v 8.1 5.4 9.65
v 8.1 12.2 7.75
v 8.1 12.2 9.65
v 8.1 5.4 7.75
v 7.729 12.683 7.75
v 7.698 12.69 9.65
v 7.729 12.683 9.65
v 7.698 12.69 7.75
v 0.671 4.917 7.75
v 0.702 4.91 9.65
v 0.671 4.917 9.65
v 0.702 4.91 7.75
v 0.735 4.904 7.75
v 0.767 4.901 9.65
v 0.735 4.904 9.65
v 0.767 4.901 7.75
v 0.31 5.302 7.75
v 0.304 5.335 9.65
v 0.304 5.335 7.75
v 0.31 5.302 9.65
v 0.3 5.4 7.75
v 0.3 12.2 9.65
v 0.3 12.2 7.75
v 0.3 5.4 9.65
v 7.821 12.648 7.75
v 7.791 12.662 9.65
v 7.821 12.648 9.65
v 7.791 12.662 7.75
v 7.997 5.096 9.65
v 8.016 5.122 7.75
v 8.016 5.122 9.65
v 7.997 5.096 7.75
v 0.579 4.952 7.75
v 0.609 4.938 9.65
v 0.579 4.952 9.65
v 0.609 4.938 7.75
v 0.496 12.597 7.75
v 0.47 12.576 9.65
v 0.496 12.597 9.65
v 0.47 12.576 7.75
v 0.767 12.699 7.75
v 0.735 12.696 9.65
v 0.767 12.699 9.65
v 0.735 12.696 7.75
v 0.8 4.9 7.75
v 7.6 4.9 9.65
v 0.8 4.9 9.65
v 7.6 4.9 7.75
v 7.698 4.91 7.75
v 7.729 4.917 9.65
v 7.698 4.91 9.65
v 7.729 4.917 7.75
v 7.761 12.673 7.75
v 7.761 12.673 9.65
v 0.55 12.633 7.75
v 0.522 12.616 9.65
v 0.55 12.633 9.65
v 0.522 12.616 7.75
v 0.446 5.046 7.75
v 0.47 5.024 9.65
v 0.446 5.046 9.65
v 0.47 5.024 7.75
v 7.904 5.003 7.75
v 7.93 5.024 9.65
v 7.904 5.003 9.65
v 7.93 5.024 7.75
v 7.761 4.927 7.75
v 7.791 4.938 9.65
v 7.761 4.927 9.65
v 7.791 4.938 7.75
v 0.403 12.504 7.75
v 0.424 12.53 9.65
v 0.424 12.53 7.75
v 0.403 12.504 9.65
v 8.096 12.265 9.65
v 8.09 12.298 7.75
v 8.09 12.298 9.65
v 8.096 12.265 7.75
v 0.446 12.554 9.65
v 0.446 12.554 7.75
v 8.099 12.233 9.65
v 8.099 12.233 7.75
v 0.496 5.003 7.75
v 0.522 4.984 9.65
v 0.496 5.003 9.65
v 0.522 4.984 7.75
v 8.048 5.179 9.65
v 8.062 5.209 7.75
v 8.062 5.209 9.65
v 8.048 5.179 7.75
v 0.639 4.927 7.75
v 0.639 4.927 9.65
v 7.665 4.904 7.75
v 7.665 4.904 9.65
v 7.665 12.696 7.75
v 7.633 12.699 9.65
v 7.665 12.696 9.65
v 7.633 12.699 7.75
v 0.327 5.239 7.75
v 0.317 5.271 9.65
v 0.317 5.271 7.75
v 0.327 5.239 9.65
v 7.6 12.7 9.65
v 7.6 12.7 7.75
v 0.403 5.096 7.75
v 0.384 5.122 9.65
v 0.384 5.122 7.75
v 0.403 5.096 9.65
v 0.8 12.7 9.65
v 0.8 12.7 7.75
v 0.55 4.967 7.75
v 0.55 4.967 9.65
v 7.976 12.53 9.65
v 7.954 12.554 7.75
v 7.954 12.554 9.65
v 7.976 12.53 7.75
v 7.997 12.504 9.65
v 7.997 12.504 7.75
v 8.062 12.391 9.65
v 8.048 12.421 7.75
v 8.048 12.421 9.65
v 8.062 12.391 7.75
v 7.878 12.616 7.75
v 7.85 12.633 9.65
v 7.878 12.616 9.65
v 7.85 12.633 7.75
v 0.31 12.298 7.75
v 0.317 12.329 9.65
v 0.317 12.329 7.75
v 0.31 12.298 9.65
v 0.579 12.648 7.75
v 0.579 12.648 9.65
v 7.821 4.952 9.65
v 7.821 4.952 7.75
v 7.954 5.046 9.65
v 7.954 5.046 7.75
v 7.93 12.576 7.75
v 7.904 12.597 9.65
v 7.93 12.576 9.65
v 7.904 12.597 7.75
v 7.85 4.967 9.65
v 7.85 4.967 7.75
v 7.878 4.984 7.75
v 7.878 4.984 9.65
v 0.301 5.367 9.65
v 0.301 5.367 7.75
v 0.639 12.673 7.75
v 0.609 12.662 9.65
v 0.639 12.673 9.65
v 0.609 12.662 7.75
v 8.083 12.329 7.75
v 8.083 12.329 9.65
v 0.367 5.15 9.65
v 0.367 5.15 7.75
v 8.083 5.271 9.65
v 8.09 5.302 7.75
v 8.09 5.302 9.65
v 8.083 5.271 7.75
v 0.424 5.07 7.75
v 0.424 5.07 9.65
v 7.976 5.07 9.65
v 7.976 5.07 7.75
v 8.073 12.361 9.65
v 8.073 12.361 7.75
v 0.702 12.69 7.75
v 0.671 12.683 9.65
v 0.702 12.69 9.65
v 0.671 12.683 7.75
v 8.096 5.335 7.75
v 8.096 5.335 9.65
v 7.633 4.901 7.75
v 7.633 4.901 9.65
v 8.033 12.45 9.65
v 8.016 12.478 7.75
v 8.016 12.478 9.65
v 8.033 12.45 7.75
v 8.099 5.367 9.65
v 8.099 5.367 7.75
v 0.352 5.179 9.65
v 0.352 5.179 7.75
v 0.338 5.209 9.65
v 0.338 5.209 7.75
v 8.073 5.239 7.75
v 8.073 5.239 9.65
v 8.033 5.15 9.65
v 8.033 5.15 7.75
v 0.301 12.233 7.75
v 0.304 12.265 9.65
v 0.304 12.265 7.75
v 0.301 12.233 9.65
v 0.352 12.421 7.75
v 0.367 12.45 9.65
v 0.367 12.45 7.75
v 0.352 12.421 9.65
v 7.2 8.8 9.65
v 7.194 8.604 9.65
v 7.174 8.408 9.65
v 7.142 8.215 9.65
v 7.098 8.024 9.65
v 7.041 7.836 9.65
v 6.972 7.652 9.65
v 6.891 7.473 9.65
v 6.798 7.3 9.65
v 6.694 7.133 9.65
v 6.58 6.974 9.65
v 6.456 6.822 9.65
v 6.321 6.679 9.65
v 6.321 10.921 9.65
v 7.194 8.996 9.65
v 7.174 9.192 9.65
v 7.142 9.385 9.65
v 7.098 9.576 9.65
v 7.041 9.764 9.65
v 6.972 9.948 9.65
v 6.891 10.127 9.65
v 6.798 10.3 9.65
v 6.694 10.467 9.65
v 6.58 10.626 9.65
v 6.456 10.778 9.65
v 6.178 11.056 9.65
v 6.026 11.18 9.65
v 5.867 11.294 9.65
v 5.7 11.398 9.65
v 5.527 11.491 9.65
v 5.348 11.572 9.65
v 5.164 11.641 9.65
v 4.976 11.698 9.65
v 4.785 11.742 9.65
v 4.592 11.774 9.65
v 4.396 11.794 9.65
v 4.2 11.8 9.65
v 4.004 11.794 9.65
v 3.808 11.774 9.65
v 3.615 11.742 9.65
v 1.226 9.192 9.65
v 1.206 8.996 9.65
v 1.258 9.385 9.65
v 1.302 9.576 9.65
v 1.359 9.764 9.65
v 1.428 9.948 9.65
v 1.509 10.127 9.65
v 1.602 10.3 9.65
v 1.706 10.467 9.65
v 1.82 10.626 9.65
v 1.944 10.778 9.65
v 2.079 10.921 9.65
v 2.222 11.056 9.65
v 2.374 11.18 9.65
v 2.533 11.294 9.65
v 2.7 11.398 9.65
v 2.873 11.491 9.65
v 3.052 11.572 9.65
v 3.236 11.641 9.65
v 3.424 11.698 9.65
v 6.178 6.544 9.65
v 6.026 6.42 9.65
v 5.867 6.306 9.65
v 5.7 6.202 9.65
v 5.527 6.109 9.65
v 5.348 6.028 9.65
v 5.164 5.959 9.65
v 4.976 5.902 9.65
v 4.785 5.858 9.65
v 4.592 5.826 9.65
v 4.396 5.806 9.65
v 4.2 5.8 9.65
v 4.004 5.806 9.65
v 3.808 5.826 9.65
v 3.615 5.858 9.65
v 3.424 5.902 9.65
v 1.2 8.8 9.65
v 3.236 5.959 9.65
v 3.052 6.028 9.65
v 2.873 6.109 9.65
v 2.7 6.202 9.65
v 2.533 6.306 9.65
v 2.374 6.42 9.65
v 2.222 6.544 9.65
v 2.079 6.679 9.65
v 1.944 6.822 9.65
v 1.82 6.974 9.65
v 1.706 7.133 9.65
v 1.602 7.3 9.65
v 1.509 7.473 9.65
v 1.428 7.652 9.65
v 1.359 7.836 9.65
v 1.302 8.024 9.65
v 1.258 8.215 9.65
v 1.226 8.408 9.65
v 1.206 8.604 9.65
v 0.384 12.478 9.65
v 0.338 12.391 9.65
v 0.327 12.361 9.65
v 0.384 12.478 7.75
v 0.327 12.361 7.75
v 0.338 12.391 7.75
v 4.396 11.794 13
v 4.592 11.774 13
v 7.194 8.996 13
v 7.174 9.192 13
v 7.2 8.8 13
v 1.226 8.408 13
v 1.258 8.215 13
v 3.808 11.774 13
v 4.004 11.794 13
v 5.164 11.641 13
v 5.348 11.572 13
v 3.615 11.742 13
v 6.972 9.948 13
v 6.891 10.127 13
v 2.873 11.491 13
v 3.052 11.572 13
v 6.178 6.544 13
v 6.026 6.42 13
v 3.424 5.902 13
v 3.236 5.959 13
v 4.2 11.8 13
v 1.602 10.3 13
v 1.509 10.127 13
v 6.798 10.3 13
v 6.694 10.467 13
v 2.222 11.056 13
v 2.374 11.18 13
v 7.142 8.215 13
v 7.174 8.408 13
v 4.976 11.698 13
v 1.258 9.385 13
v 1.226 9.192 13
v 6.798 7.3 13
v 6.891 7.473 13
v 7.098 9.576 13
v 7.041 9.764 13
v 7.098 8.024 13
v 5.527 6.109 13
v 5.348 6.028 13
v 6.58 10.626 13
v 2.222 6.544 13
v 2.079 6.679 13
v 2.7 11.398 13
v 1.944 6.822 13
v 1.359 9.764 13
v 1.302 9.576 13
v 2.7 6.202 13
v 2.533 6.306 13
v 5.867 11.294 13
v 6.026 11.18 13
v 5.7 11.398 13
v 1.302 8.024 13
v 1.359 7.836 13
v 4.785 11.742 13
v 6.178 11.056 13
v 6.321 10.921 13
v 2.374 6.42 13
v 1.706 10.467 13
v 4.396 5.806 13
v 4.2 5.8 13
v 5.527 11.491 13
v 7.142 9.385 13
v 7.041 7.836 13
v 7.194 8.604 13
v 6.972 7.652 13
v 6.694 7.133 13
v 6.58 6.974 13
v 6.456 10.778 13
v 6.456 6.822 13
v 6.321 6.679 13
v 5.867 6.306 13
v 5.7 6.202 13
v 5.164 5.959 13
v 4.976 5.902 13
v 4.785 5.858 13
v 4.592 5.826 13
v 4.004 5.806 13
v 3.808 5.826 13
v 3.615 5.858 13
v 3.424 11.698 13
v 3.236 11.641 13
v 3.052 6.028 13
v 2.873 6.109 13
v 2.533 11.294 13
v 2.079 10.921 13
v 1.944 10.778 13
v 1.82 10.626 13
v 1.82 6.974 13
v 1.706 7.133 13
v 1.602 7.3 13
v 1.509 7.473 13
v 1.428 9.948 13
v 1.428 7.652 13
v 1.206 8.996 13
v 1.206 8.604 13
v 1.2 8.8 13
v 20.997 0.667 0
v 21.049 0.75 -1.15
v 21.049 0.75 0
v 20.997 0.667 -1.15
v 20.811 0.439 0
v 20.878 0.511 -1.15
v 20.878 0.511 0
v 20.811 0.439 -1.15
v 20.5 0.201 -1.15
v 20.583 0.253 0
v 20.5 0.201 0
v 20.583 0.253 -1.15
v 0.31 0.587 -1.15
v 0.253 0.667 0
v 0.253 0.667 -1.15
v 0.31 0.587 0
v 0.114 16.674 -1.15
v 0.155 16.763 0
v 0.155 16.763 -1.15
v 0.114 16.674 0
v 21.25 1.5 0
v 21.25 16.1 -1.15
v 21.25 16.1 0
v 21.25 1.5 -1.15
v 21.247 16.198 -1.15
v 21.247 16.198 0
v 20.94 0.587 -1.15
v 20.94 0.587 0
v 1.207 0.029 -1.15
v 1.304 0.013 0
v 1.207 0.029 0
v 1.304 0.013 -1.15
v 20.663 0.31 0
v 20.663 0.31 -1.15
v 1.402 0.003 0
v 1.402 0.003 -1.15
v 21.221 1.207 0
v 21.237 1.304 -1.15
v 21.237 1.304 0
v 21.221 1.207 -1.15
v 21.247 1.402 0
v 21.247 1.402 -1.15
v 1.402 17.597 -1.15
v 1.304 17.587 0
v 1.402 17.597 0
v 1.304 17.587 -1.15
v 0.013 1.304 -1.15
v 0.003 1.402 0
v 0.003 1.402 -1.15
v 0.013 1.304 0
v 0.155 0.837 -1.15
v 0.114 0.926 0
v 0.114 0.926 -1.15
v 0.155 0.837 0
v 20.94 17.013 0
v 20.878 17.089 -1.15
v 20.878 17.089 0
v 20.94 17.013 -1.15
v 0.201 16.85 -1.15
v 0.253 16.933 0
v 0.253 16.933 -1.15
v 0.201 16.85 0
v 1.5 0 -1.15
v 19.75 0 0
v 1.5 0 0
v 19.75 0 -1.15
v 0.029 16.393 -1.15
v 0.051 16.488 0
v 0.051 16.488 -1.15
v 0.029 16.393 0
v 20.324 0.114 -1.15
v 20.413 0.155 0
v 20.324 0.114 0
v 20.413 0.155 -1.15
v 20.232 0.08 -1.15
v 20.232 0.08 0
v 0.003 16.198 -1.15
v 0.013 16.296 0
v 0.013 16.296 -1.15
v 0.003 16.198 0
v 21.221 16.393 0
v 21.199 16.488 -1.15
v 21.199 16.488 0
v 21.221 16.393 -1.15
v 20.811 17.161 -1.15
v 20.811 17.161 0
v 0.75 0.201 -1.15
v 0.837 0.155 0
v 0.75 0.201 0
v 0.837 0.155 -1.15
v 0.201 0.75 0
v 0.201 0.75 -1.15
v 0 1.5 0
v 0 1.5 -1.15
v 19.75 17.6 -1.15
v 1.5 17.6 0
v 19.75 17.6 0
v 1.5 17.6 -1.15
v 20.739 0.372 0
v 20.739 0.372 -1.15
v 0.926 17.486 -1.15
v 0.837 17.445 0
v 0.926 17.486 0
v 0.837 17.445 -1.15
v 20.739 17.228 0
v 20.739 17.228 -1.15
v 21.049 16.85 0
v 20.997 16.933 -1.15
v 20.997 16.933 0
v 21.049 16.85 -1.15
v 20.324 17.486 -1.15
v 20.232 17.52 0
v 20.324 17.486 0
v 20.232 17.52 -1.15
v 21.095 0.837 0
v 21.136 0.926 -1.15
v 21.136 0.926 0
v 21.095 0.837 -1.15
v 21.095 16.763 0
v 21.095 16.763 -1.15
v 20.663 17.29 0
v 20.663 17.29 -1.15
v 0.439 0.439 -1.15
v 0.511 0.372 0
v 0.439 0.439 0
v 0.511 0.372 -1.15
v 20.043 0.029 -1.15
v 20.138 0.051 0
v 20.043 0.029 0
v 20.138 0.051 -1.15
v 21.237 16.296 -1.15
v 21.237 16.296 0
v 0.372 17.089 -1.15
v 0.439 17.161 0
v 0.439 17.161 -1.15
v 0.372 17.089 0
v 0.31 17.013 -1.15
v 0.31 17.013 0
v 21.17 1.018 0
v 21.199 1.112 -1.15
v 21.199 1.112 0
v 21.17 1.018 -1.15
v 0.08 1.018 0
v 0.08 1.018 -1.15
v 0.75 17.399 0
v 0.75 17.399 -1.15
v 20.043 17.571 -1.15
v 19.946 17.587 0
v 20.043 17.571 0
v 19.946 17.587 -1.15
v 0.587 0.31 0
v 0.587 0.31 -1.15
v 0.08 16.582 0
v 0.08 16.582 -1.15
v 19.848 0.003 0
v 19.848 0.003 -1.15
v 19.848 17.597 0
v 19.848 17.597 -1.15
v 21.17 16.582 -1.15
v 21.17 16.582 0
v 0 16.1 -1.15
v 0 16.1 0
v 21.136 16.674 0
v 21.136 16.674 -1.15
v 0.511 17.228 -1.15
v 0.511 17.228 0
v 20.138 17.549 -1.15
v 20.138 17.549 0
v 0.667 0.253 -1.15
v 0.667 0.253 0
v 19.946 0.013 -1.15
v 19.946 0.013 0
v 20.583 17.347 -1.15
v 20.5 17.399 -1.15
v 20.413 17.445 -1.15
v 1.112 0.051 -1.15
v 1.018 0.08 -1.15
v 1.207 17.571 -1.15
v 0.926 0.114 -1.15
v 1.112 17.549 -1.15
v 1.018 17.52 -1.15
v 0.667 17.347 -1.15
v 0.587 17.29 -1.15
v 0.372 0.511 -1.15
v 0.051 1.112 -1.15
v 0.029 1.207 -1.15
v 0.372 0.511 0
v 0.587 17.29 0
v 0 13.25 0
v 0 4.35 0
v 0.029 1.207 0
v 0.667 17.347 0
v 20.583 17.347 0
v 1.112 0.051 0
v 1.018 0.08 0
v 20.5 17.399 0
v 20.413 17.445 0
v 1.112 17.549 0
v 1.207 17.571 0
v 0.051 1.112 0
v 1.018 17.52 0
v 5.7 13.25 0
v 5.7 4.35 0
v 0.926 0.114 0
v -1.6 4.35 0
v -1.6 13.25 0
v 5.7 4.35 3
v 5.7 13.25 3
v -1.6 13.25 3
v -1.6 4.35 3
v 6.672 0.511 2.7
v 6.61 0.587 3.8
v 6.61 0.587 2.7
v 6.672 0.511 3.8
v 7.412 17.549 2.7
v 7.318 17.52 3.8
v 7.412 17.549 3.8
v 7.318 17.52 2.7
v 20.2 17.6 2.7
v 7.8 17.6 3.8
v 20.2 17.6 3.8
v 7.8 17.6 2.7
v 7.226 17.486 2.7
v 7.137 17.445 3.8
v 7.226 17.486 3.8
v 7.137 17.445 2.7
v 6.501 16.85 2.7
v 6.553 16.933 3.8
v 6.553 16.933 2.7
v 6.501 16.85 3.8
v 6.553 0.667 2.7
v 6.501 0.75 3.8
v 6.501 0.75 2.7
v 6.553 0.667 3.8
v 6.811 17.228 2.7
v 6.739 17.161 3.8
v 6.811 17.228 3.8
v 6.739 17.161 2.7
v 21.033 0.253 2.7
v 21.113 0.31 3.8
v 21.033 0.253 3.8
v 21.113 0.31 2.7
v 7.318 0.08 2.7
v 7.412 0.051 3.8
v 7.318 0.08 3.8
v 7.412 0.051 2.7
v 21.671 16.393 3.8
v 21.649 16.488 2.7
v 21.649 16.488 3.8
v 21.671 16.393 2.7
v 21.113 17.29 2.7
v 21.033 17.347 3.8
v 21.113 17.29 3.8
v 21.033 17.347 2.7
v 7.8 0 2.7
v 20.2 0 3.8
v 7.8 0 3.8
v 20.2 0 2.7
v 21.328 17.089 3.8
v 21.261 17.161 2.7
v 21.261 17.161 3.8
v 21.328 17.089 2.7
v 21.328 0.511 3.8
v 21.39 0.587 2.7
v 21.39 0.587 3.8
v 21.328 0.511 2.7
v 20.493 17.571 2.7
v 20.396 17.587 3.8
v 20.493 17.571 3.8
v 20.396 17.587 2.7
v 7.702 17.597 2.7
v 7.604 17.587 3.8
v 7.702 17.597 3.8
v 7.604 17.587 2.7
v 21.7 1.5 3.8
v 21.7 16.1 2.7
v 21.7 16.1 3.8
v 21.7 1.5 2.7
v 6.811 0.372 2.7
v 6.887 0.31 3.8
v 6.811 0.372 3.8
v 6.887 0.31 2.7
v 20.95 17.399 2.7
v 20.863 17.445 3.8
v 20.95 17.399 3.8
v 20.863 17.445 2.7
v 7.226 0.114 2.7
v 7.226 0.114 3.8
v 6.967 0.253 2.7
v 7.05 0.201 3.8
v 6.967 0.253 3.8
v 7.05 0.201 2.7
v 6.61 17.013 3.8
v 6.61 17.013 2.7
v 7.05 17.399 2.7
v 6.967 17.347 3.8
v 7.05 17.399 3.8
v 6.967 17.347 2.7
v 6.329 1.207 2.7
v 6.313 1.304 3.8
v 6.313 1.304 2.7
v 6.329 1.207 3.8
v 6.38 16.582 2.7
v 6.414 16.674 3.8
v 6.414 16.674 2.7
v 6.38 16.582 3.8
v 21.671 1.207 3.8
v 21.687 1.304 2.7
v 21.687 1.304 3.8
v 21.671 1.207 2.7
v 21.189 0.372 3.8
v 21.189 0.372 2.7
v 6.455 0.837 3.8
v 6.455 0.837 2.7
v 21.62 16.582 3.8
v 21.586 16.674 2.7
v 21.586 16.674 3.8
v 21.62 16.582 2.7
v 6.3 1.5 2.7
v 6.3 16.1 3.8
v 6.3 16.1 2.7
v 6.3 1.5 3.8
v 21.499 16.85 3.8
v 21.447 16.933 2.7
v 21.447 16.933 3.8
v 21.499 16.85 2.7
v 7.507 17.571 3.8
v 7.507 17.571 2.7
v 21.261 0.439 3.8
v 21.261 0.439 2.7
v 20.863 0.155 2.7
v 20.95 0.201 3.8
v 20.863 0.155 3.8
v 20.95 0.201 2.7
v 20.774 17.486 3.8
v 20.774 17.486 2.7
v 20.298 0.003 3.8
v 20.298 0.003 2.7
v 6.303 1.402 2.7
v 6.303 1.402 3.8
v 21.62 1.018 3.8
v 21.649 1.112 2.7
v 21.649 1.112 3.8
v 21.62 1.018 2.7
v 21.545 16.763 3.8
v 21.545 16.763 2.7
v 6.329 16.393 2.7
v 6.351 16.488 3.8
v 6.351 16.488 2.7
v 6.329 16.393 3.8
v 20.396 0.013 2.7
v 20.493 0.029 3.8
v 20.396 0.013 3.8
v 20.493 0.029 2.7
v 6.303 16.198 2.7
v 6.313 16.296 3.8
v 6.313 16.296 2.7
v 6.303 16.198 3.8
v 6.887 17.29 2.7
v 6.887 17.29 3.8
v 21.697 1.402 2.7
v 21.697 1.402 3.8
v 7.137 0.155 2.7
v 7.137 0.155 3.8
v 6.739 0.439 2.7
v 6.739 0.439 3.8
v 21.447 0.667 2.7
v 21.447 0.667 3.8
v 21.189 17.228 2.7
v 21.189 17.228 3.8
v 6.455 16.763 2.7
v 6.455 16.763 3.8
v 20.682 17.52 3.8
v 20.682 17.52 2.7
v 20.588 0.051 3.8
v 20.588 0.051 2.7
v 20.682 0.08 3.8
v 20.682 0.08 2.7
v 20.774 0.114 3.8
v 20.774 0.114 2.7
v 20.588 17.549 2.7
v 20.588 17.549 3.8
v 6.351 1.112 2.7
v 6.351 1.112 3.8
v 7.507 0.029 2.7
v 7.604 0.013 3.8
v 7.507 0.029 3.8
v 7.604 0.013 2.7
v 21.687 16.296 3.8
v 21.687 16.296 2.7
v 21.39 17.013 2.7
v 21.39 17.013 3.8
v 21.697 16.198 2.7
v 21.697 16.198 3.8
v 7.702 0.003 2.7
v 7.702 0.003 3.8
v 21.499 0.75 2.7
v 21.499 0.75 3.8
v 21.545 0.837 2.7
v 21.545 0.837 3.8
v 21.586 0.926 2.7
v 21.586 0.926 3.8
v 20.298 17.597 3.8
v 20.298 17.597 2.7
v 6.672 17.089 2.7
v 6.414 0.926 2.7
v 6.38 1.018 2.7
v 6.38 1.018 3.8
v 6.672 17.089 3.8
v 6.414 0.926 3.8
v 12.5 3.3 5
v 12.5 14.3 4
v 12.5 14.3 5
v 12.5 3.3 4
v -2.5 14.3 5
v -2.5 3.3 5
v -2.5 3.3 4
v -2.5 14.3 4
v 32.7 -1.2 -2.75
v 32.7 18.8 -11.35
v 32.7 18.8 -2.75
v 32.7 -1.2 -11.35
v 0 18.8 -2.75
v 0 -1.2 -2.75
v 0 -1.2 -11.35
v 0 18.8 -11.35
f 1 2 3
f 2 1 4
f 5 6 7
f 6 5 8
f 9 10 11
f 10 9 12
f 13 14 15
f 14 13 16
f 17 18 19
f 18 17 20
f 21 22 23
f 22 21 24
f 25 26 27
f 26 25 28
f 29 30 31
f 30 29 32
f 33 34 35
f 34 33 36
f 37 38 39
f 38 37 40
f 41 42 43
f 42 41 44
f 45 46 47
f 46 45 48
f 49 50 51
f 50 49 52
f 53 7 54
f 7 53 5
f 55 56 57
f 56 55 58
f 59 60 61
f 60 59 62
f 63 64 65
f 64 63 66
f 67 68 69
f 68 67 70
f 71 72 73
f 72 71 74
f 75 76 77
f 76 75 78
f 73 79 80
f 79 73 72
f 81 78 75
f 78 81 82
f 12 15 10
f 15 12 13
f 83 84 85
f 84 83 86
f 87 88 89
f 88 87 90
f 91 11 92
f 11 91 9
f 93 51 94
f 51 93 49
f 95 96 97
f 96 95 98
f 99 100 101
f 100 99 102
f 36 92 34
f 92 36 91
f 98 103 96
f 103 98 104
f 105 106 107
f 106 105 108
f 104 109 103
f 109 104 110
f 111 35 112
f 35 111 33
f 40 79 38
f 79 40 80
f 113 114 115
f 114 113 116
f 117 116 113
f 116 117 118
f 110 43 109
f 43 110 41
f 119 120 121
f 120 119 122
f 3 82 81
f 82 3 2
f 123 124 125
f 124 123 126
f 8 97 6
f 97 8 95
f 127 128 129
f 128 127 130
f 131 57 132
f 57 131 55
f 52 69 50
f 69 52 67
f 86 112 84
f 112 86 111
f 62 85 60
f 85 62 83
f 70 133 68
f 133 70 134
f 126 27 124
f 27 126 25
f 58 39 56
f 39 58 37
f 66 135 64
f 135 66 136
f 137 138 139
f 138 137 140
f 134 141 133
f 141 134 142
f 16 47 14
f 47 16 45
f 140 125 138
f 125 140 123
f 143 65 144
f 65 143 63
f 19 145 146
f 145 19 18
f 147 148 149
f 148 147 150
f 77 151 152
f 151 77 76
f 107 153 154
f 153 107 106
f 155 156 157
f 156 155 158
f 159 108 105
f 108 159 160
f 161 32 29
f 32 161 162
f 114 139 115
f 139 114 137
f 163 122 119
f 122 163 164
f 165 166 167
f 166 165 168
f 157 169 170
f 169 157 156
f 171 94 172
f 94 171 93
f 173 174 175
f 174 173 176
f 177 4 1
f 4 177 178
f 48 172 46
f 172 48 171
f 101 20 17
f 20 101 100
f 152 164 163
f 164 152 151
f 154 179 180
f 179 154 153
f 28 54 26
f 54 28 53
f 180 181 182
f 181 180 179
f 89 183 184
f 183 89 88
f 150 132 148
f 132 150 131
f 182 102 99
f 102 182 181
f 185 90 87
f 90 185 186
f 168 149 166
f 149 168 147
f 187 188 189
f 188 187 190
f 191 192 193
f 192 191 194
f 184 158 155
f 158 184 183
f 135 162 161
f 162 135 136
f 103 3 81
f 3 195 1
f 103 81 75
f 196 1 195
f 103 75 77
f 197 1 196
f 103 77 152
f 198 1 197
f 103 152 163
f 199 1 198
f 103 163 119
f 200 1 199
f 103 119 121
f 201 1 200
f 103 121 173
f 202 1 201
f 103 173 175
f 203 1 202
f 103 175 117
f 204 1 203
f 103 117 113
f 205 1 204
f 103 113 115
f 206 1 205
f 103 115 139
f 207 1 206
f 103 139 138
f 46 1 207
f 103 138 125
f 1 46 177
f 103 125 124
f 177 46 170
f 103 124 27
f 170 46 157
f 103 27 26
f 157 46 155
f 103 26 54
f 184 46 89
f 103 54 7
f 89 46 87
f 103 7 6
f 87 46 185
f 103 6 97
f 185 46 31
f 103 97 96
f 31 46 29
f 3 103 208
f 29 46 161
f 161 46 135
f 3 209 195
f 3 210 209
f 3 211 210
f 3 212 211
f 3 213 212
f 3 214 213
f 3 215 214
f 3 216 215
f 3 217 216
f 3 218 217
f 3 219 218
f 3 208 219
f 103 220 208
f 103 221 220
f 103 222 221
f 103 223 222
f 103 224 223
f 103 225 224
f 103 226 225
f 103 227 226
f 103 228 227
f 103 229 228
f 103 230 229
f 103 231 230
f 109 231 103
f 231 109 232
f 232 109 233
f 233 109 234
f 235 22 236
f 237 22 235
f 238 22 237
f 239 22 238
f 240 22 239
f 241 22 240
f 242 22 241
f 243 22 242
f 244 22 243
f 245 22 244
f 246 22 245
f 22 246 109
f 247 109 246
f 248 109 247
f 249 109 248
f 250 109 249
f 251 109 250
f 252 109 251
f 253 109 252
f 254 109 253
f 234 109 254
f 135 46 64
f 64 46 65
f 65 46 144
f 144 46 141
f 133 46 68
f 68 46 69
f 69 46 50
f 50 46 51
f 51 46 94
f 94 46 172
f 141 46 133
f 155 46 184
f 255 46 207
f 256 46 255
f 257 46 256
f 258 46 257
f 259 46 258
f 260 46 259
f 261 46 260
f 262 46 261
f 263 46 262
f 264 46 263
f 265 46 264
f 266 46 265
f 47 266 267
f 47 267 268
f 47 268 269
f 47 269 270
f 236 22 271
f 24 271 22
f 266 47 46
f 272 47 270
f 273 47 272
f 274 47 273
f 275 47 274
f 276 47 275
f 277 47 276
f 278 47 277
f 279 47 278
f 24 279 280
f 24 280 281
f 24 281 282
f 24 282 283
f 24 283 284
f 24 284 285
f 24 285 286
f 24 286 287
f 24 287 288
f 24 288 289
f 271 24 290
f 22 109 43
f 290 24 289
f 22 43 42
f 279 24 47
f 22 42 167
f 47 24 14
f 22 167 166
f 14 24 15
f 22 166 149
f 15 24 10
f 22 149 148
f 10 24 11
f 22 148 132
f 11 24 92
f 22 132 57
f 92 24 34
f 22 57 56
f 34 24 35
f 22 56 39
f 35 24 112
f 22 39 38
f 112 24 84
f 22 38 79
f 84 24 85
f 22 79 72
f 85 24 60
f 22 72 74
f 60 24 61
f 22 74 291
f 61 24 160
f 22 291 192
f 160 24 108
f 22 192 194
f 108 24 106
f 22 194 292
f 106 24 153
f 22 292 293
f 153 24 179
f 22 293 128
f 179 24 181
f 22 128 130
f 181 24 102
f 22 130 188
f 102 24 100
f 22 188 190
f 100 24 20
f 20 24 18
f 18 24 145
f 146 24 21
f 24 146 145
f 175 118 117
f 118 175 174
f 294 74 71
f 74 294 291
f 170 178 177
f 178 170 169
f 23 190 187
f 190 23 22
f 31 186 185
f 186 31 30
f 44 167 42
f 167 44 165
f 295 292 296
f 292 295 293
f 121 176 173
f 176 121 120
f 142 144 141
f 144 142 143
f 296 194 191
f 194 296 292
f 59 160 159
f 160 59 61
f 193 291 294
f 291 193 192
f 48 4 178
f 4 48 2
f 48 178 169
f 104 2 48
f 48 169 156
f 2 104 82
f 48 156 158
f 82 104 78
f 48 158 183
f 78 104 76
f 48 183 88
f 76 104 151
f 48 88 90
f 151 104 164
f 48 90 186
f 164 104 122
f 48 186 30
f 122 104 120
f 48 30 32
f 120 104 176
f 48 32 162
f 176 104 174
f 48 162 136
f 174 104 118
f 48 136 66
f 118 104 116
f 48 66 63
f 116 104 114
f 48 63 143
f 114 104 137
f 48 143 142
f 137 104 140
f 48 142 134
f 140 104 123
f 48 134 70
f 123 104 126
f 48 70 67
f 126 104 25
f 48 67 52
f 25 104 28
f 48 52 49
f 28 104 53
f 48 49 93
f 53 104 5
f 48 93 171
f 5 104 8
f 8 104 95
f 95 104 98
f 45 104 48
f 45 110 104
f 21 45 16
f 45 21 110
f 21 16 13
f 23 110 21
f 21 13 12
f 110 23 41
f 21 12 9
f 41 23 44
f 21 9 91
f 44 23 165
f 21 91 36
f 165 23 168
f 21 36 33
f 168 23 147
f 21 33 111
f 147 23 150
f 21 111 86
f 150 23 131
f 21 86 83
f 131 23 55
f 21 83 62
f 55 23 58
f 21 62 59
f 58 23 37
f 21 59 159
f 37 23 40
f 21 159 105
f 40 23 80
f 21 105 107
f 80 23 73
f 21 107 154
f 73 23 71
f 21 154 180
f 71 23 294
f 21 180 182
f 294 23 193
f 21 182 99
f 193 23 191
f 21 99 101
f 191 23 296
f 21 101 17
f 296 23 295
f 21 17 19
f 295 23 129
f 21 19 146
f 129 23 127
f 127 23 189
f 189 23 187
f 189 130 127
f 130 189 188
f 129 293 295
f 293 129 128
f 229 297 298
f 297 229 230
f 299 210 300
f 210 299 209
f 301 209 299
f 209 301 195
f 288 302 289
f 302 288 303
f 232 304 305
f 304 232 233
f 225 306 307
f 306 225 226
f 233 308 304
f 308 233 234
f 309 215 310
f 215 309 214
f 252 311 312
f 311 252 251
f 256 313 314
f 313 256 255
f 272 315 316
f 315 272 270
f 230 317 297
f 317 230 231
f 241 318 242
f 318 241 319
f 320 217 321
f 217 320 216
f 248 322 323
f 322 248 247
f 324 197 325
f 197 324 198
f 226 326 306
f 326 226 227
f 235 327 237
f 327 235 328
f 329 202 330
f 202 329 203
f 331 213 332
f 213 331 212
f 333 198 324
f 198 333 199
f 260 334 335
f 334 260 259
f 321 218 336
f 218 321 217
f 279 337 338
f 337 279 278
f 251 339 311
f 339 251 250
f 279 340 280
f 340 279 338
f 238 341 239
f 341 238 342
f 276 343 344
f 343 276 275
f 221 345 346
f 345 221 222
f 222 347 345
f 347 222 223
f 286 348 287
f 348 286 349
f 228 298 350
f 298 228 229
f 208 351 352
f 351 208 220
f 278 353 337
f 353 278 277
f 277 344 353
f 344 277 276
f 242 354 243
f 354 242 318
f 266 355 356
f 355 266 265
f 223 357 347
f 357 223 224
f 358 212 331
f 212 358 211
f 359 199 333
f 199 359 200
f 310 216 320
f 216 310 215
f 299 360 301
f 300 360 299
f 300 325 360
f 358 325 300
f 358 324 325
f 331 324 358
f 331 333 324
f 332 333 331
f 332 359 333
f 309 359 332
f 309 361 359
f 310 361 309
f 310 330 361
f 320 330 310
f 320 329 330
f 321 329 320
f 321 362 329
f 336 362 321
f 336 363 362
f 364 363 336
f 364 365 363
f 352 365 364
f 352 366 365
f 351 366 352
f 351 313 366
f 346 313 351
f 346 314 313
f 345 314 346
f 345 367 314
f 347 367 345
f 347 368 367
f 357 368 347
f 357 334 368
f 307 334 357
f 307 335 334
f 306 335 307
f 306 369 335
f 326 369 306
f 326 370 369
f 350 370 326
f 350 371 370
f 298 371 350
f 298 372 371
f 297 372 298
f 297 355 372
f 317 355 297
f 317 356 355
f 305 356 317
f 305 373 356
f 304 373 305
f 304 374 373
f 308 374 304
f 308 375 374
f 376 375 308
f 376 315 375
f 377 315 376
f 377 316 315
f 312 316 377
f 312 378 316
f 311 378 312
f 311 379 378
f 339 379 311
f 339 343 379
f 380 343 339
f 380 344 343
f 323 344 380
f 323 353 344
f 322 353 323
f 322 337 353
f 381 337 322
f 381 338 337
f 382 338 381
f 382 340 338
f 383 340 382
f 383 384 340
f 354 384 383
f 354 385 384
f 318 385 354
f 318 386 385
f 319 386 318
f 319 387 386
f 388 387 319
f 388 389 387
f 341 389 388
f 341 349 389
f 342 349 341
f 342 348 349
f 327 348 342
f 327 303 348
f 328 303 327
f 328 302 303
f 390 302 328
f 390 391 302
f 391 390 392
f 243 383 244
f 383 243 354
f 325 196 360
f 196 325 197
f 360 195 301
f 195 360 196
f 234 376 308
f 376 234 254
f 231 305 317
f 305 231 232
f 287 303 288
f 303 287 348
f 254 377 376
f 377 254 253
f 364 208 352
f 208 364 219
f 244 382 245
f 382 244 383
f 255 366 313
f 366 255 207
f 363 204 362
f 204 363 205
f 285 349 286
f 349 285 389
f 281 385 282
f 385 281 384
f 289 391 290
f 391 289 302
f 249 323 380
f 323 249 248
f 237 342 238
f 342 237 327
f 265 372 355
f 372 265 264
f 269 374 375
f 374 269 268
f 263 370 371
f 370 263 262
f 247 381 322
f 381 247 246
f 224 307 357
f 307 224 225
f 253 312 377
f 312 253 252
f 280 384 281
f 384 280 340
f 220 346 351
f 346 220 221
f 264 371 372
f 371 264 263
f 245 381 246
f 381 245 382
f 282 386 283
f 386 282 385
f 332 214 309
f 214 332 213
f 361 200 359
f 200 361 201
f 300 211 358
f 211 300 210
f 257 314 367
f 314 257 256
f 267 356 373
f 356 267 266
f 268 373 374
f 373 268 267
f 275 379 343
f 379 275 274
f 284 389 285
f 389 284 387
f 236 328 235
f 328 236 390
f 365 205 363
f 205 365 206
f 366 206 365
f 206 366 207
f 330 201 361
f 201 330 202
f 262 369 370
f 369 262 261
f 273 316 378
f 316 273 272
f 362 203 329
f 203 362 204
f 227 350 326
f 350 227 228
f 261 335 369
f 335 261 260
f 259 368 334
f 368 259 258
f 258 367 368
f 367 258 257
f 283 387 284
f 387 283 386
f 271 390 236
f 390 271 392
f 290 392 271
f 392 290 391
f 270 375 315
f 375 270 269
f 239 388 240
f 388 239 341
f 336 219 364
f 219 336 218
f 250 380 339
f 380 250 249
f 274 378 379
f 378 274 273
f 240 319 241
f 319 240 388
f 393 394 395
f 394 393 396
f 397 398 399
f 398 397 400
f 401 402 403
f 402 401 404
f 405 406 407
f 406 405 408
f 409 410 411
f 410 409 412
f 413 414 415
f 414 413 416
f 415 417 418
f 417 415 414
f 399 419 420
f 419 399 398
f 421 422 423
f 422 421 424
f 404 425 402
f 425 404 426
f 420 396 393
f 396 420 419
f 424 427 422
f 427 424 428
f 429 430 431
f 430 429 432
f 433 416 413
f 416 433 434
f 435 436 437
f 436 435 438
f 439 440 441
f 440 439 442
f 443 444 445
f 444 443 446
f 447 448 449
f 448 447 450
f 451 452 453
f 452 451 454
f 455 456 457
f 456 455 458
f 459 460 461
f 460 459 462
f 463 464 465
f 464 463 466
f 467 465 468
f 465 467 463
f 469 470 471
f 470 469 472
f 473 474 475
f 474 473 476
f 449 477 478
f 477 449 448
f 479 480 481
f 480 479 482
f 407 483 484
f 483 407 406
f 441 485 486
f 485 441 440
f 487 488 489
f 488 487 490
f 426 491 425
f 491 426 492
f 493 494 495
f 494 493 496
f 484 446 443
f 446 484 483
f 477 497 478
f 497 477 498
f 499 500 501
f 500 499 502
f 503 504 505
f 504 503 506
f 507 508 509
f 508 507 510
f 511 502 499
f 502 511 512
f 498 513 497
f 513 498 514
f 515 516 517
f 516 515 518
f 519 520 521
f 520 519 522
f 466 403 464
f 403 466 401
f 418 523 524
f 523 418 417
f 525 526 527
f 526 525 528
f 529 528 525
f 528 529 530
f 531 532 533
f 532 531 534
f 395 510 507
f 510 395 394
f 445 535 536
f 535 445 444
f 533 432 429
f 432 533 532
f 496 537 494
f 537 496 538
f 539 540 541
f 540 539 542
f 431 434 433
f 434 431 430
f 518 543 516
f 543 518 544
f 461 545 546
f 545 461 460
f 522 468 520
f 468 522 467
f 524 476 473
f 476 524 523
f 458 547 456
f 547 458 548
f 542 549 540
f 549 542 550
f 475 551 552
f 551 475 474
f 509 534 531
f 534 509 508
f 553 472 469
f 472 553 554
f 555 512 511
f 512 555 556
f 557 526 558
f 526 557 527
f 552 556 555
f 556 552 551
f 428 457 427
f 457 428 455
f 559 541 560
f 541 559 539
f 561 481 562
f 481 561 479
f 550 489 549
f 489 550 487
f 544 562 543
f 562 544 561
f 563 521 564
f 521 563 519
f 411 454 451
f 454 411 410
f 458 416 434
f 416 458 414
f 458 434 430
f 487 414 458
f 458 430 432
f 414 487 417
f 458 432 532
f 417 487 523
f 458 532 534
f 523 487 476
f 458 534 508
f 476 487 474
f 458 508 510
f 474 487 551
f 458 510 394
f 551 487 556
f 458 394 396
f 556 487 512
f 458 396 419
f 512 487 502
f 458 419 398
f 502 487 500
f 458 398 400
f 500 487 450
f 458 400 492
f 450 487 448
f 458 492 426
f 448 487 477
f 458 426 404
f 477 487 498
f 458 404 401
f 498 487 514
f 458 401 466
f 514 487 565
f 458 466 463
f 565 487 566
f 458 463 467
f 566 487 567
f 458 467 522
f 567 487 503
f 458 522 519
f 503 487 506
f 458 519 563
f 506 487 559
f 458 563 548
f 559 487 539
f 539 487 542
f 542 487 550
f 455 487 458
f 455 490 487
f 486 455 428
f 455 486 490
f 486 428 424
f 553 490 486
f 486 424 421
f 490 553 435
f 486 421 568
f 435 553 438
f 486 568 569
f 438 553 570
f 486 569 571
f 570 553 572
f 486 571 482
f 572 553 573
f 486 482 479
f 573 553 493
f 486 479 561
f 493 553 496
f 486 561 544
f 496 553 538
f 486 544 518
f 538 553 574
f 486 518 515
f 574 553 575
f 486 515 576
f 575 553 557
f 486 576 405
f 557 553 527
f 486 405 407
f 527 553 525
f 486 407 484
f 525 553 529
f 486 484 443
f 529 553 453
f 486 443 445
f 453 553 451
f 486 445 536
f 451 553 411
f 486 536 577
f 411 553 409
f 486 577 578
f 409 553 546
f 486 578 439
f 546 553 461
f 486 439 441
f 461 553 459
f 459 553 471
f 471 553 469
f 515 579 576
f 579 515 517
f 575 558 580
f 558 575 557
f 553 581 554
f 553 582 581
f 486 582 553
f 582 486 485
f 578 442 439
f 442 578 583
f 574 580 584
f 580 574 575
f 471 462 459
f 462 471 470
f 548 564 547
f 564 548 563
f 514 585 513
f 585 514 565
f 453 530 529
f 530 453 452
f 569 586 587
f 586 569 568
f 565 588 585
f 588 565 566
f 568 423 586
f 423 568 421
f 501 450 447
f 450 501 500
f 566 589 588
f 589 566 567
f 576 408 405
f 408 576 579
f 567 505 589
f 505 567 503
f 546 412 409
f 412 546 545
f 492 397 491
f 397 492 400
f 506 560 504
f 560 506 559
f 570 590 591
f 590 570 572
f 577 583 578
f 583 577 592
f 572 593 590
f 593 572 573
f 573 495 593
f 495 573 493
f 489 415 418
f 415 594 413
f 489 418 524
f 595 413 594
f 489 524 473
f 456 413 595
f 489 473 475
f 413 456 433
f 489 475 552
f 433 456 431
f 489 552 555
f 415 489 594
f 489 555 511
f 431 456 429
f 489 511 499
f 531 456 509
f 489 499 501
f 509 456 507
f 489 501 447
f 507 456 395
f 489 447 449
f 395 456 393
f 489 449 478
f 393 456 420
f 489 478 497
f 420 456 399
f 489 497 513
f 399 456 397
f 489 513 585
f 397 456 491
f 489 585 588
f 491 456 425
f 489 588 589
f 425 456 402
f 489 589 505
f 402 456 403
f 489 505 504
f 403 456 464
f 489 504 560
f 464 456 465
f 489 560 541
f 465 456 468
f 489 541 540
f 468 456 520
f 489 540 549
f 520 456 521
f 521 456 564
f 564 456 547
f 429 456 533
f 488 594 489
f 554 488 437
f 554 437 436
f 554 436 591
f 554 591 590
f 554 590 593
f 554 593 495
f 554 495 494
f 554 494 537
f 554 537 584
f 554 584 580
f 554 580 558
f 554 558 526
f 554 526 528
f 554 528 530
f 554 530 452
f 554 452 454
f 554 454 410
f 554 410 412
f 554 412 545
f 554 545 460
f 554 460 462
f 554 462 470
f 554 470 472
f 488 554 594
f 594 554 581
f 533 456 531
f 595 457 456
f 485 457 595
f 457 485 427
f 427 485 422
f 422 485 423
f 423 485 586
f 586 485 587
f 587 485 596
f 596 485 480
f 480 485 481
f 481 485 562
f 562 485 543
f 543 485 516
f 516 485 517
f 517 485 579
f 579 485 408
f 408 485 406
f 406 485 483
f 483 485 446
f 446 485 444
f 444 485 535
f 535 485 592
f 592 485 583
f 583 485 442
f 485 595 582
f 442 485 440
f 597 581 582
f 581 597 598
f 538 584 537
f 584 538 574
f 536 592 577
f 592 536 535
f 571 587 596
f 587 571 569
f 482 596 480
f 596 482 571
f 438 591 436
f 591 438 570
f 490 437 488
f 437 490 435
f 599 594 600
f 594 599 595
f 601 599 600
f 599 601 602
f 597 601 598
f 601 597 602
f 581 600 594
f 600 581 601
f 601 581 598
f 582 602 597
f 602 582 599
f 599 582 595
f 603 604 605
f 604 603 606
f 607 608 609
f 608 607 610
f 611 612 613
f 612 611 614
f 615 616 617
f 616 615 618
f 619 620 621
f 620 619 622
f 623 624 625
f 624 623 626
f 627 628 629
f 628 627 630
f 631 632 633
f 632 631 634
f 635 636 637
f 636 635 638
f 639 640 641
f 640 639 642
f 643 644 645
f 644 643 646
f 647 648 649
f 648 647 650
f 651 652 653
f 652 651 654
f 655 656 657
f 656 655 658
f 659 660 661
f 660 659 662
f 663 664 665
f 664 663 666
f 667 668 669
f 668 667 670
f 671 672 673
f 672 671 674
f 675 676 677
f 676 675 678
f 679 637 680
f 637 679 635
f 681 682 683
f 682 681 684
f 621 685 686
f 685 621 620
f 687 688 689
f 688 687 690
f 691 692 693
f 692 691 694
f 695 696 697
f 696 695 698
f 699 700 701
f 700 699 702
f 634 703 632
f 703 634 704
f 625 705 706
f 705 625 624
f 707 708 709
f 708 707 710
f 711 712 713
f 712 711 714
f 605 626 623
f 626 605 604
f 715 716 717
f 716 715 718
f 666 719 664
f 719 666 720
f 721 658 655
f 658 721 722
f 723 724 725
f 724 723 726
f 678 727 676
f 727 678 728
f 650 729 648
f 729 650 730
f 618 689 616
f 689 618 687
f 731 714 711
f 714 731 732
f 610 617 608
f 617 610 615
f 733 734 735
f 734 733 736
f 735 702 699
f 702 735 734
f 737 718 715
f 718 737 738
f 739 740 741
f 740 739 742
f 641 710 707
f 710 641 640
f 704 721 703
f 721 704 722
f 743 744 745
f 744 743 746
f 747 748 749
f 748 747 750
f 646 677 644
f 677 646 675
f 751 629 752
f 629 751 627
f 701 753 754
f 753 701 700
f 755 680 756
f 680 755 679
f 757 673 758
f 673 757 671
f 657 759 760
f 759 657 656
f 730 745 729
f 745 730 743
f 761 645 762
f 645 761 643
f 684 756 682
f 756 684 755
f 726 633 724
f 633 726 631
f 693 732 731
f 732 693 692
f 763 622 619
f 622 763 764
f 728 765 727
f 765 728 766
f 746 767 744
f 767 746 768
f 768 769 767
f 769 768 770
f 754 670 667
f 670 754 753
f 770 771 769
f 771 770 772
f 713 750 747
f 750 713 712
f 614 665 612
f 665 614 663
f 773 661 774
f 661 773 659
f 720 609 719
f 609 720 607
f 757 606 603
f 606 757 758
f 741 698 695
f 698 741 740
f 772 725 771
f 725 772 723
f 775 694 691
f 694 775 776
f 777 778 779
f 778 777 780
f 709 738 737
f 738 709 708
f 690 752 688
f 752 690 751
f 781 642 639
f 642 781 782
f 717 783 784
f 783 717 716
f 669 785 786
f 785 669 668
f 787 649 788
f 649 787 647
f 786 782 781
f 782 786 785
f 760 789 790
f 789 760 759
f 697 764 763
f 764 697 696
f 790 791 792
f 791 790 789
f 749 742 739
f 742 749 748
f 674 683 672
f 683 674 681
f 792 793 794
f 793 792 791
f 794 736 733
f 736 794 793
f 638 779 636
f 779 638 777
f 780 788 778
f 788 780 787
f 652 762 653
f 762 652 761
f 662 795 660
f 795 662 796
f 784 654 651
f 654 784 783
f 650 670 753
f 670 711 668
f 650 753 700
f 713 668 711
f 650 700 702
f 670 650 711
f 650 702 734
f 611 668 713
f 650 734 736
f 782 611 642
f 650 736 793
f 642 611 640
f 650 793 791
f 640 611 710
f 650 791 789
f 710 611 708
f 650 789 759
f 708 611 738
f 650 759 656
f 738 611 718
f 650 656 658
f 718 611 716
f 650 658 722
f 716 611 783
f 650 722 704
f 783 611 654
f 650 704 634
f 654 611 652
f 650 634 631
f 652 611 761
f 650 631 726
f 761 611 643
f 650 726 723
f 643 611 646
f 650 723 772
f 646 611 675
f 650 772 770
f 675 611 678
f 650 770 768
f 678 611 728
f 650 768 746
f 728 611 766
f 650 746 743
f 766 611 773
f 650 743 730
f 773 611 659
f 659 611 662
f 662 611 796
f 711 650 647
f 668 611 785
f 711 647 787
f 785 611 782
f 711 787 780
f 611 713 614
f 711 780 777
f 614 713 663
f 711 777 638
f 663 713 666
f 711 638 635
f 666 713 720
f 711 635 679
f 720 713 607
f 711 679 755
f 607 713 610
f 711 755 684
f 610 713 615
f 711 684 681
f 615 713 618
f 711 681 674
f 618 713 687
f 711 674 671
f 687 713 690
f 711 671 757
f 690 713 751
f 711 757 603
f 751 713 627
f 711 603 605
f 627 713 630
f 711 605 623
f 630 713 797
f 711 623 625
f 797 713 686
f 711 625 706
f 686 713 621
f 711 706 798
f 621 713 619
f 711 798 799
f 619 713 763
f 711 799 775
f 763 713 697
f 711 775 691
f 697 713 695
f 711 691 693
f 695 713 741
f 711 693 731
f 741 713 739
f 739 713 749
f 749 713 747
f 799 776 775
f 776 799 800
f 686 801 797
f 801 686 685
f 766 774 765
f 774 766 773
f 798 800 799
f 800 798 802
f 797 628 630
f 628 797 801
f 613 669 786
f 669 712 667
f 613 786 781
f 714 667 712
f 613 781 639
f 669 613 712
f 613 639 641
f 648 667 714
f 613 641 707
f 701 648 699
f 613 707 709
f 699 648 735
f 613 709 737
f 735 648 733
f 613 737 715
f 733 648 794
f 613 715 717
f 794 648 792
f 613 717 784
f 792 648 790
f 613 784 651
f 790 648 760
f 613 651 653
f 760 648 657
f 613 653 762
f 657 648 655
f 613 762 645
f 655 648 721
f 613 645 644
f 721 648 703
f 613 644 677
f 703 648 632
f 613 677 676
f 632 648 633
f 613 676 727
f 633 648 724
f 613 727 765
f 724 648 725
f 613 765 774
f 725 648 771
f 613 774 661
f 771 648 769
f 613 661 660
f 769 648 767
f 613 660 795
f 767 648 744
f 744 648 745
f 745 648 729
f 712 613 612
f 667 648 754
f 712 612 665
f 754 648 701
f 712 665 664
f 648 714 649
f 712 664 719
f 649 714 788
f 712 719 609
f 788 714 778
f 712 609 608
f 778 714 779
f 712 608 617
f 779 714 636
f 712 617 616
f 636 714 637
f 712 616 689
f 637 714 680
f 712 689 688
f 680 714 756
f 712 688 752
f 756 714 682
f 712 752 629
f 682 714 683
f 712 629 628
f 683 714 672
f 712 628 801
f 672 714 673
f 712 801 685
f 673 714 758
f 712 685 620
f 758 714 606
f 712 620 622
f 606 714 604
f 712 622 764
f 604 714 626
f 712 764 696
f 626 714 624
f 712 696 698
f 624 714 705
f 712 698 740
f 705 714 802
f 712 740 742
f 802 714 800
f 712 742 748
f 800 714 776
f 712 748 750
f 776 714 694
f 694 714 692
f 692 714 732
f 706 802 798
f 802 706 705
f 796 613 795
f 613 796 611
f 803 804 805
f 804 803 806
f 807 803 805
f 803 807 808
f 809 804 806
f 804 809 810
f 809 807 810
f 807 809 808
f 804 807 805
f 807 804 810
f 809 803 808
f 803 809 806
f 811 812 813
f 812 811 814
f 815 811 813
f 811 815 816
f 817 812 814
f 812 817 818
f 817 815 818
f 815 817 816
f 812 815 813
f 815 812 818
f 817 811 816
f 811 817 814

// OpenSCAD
// envsense クリップ筐体 — トップレベル / 表示・書き出しの切替 (Phase 1 / #2)
//
// 使い方:
//   GUI      : mode を切り替えてプレビュー（F5）/ レンダー（F6）
//   CLI 書き出し（造形プロセスに合わせて壁厚等は params.scad で調整）:
//     openscad -D 'mode="bottom"' -o export/clip_bottom.stl clip.scad
//     openscad -D 'mode="top"'    -o export/clip_top.stl    clip.scad
//     openscad -D 'mode="bottom"' -o export/clip_bottom.3mf clip.scad
//
//   variant:
//     "box"    — Phase 1 の角丸ボックス筐体（既定。挙動は従来どおり）
//     "pebble" — 川石モチーフ外形 + 裏面の一体成形フレックスクリップ（プロダクト外観）
//   mode:
//     "assembly" — 筐体（半透明）+ 内蔵部品（pebble は一体クリップも表示）。干渉・配置の目視確認用
//     "shell"    — 分割前の一体筐体
//     "bottom"   — 本体（Sense/カメラ/バッテリー側, z<=0。pebble はクリップ込み）  ※入稿候補
//     "top"      — 蓋（USB-C 側, z>=0）                                            ※入稿候補
//     "parts"    — 内蔵部品のみ
//
//   CLI 書き出し例（pebble。クリップは bottom と一体なので専用パーツ書き出しは無い）:
//     openscad -D 'variant="pebble"' -D 'mode="bottom"' -o export/pebble_bottom.stl clip.scad
//     openscad -D 'variant="pebble"' -D 'mode="top"'    -o export/pebble_top.stl    clip.scad

variant = "box";
mode = "assembly";

include <params.scad>
use <parts.scad>
use <enclosure.scad>
use <enclosure_pebble.scad>

if (variant == "pebble") {
    if (mode == "assembly") {
        device_assembly();
        clip_flex();             // 一体クリップ（bottom 所属）も配置確認用に表示
        %pebble_shell_solid();   // % = 半透明。外形を透かして干渉確認
    } else if (mode == "shell") {
        pebble_shell_solid();
        clip_flex();
    } else if (mode == "bottom") {
        pebble_enclosure_bottom();
    } else if (mode == "top") {
        pebble_enclosure_top();
    } else if (mode == "parts") {
        device_assembly();
    }
} else {
    if (mode == "assembly") {
        device_assembly();
        %shell_solid();            // % = 半透明モディファイア。筐体を透かして干渉確認
    } else if (mode == "shell") {
        shell_solid();
    } else if (mode == "bottom") {
        enclosure_bottom();
    } else if (mode == "top") {
        enclosure_top();
    } else if (mode == "parts") {
        device_assembly();
    }
}
